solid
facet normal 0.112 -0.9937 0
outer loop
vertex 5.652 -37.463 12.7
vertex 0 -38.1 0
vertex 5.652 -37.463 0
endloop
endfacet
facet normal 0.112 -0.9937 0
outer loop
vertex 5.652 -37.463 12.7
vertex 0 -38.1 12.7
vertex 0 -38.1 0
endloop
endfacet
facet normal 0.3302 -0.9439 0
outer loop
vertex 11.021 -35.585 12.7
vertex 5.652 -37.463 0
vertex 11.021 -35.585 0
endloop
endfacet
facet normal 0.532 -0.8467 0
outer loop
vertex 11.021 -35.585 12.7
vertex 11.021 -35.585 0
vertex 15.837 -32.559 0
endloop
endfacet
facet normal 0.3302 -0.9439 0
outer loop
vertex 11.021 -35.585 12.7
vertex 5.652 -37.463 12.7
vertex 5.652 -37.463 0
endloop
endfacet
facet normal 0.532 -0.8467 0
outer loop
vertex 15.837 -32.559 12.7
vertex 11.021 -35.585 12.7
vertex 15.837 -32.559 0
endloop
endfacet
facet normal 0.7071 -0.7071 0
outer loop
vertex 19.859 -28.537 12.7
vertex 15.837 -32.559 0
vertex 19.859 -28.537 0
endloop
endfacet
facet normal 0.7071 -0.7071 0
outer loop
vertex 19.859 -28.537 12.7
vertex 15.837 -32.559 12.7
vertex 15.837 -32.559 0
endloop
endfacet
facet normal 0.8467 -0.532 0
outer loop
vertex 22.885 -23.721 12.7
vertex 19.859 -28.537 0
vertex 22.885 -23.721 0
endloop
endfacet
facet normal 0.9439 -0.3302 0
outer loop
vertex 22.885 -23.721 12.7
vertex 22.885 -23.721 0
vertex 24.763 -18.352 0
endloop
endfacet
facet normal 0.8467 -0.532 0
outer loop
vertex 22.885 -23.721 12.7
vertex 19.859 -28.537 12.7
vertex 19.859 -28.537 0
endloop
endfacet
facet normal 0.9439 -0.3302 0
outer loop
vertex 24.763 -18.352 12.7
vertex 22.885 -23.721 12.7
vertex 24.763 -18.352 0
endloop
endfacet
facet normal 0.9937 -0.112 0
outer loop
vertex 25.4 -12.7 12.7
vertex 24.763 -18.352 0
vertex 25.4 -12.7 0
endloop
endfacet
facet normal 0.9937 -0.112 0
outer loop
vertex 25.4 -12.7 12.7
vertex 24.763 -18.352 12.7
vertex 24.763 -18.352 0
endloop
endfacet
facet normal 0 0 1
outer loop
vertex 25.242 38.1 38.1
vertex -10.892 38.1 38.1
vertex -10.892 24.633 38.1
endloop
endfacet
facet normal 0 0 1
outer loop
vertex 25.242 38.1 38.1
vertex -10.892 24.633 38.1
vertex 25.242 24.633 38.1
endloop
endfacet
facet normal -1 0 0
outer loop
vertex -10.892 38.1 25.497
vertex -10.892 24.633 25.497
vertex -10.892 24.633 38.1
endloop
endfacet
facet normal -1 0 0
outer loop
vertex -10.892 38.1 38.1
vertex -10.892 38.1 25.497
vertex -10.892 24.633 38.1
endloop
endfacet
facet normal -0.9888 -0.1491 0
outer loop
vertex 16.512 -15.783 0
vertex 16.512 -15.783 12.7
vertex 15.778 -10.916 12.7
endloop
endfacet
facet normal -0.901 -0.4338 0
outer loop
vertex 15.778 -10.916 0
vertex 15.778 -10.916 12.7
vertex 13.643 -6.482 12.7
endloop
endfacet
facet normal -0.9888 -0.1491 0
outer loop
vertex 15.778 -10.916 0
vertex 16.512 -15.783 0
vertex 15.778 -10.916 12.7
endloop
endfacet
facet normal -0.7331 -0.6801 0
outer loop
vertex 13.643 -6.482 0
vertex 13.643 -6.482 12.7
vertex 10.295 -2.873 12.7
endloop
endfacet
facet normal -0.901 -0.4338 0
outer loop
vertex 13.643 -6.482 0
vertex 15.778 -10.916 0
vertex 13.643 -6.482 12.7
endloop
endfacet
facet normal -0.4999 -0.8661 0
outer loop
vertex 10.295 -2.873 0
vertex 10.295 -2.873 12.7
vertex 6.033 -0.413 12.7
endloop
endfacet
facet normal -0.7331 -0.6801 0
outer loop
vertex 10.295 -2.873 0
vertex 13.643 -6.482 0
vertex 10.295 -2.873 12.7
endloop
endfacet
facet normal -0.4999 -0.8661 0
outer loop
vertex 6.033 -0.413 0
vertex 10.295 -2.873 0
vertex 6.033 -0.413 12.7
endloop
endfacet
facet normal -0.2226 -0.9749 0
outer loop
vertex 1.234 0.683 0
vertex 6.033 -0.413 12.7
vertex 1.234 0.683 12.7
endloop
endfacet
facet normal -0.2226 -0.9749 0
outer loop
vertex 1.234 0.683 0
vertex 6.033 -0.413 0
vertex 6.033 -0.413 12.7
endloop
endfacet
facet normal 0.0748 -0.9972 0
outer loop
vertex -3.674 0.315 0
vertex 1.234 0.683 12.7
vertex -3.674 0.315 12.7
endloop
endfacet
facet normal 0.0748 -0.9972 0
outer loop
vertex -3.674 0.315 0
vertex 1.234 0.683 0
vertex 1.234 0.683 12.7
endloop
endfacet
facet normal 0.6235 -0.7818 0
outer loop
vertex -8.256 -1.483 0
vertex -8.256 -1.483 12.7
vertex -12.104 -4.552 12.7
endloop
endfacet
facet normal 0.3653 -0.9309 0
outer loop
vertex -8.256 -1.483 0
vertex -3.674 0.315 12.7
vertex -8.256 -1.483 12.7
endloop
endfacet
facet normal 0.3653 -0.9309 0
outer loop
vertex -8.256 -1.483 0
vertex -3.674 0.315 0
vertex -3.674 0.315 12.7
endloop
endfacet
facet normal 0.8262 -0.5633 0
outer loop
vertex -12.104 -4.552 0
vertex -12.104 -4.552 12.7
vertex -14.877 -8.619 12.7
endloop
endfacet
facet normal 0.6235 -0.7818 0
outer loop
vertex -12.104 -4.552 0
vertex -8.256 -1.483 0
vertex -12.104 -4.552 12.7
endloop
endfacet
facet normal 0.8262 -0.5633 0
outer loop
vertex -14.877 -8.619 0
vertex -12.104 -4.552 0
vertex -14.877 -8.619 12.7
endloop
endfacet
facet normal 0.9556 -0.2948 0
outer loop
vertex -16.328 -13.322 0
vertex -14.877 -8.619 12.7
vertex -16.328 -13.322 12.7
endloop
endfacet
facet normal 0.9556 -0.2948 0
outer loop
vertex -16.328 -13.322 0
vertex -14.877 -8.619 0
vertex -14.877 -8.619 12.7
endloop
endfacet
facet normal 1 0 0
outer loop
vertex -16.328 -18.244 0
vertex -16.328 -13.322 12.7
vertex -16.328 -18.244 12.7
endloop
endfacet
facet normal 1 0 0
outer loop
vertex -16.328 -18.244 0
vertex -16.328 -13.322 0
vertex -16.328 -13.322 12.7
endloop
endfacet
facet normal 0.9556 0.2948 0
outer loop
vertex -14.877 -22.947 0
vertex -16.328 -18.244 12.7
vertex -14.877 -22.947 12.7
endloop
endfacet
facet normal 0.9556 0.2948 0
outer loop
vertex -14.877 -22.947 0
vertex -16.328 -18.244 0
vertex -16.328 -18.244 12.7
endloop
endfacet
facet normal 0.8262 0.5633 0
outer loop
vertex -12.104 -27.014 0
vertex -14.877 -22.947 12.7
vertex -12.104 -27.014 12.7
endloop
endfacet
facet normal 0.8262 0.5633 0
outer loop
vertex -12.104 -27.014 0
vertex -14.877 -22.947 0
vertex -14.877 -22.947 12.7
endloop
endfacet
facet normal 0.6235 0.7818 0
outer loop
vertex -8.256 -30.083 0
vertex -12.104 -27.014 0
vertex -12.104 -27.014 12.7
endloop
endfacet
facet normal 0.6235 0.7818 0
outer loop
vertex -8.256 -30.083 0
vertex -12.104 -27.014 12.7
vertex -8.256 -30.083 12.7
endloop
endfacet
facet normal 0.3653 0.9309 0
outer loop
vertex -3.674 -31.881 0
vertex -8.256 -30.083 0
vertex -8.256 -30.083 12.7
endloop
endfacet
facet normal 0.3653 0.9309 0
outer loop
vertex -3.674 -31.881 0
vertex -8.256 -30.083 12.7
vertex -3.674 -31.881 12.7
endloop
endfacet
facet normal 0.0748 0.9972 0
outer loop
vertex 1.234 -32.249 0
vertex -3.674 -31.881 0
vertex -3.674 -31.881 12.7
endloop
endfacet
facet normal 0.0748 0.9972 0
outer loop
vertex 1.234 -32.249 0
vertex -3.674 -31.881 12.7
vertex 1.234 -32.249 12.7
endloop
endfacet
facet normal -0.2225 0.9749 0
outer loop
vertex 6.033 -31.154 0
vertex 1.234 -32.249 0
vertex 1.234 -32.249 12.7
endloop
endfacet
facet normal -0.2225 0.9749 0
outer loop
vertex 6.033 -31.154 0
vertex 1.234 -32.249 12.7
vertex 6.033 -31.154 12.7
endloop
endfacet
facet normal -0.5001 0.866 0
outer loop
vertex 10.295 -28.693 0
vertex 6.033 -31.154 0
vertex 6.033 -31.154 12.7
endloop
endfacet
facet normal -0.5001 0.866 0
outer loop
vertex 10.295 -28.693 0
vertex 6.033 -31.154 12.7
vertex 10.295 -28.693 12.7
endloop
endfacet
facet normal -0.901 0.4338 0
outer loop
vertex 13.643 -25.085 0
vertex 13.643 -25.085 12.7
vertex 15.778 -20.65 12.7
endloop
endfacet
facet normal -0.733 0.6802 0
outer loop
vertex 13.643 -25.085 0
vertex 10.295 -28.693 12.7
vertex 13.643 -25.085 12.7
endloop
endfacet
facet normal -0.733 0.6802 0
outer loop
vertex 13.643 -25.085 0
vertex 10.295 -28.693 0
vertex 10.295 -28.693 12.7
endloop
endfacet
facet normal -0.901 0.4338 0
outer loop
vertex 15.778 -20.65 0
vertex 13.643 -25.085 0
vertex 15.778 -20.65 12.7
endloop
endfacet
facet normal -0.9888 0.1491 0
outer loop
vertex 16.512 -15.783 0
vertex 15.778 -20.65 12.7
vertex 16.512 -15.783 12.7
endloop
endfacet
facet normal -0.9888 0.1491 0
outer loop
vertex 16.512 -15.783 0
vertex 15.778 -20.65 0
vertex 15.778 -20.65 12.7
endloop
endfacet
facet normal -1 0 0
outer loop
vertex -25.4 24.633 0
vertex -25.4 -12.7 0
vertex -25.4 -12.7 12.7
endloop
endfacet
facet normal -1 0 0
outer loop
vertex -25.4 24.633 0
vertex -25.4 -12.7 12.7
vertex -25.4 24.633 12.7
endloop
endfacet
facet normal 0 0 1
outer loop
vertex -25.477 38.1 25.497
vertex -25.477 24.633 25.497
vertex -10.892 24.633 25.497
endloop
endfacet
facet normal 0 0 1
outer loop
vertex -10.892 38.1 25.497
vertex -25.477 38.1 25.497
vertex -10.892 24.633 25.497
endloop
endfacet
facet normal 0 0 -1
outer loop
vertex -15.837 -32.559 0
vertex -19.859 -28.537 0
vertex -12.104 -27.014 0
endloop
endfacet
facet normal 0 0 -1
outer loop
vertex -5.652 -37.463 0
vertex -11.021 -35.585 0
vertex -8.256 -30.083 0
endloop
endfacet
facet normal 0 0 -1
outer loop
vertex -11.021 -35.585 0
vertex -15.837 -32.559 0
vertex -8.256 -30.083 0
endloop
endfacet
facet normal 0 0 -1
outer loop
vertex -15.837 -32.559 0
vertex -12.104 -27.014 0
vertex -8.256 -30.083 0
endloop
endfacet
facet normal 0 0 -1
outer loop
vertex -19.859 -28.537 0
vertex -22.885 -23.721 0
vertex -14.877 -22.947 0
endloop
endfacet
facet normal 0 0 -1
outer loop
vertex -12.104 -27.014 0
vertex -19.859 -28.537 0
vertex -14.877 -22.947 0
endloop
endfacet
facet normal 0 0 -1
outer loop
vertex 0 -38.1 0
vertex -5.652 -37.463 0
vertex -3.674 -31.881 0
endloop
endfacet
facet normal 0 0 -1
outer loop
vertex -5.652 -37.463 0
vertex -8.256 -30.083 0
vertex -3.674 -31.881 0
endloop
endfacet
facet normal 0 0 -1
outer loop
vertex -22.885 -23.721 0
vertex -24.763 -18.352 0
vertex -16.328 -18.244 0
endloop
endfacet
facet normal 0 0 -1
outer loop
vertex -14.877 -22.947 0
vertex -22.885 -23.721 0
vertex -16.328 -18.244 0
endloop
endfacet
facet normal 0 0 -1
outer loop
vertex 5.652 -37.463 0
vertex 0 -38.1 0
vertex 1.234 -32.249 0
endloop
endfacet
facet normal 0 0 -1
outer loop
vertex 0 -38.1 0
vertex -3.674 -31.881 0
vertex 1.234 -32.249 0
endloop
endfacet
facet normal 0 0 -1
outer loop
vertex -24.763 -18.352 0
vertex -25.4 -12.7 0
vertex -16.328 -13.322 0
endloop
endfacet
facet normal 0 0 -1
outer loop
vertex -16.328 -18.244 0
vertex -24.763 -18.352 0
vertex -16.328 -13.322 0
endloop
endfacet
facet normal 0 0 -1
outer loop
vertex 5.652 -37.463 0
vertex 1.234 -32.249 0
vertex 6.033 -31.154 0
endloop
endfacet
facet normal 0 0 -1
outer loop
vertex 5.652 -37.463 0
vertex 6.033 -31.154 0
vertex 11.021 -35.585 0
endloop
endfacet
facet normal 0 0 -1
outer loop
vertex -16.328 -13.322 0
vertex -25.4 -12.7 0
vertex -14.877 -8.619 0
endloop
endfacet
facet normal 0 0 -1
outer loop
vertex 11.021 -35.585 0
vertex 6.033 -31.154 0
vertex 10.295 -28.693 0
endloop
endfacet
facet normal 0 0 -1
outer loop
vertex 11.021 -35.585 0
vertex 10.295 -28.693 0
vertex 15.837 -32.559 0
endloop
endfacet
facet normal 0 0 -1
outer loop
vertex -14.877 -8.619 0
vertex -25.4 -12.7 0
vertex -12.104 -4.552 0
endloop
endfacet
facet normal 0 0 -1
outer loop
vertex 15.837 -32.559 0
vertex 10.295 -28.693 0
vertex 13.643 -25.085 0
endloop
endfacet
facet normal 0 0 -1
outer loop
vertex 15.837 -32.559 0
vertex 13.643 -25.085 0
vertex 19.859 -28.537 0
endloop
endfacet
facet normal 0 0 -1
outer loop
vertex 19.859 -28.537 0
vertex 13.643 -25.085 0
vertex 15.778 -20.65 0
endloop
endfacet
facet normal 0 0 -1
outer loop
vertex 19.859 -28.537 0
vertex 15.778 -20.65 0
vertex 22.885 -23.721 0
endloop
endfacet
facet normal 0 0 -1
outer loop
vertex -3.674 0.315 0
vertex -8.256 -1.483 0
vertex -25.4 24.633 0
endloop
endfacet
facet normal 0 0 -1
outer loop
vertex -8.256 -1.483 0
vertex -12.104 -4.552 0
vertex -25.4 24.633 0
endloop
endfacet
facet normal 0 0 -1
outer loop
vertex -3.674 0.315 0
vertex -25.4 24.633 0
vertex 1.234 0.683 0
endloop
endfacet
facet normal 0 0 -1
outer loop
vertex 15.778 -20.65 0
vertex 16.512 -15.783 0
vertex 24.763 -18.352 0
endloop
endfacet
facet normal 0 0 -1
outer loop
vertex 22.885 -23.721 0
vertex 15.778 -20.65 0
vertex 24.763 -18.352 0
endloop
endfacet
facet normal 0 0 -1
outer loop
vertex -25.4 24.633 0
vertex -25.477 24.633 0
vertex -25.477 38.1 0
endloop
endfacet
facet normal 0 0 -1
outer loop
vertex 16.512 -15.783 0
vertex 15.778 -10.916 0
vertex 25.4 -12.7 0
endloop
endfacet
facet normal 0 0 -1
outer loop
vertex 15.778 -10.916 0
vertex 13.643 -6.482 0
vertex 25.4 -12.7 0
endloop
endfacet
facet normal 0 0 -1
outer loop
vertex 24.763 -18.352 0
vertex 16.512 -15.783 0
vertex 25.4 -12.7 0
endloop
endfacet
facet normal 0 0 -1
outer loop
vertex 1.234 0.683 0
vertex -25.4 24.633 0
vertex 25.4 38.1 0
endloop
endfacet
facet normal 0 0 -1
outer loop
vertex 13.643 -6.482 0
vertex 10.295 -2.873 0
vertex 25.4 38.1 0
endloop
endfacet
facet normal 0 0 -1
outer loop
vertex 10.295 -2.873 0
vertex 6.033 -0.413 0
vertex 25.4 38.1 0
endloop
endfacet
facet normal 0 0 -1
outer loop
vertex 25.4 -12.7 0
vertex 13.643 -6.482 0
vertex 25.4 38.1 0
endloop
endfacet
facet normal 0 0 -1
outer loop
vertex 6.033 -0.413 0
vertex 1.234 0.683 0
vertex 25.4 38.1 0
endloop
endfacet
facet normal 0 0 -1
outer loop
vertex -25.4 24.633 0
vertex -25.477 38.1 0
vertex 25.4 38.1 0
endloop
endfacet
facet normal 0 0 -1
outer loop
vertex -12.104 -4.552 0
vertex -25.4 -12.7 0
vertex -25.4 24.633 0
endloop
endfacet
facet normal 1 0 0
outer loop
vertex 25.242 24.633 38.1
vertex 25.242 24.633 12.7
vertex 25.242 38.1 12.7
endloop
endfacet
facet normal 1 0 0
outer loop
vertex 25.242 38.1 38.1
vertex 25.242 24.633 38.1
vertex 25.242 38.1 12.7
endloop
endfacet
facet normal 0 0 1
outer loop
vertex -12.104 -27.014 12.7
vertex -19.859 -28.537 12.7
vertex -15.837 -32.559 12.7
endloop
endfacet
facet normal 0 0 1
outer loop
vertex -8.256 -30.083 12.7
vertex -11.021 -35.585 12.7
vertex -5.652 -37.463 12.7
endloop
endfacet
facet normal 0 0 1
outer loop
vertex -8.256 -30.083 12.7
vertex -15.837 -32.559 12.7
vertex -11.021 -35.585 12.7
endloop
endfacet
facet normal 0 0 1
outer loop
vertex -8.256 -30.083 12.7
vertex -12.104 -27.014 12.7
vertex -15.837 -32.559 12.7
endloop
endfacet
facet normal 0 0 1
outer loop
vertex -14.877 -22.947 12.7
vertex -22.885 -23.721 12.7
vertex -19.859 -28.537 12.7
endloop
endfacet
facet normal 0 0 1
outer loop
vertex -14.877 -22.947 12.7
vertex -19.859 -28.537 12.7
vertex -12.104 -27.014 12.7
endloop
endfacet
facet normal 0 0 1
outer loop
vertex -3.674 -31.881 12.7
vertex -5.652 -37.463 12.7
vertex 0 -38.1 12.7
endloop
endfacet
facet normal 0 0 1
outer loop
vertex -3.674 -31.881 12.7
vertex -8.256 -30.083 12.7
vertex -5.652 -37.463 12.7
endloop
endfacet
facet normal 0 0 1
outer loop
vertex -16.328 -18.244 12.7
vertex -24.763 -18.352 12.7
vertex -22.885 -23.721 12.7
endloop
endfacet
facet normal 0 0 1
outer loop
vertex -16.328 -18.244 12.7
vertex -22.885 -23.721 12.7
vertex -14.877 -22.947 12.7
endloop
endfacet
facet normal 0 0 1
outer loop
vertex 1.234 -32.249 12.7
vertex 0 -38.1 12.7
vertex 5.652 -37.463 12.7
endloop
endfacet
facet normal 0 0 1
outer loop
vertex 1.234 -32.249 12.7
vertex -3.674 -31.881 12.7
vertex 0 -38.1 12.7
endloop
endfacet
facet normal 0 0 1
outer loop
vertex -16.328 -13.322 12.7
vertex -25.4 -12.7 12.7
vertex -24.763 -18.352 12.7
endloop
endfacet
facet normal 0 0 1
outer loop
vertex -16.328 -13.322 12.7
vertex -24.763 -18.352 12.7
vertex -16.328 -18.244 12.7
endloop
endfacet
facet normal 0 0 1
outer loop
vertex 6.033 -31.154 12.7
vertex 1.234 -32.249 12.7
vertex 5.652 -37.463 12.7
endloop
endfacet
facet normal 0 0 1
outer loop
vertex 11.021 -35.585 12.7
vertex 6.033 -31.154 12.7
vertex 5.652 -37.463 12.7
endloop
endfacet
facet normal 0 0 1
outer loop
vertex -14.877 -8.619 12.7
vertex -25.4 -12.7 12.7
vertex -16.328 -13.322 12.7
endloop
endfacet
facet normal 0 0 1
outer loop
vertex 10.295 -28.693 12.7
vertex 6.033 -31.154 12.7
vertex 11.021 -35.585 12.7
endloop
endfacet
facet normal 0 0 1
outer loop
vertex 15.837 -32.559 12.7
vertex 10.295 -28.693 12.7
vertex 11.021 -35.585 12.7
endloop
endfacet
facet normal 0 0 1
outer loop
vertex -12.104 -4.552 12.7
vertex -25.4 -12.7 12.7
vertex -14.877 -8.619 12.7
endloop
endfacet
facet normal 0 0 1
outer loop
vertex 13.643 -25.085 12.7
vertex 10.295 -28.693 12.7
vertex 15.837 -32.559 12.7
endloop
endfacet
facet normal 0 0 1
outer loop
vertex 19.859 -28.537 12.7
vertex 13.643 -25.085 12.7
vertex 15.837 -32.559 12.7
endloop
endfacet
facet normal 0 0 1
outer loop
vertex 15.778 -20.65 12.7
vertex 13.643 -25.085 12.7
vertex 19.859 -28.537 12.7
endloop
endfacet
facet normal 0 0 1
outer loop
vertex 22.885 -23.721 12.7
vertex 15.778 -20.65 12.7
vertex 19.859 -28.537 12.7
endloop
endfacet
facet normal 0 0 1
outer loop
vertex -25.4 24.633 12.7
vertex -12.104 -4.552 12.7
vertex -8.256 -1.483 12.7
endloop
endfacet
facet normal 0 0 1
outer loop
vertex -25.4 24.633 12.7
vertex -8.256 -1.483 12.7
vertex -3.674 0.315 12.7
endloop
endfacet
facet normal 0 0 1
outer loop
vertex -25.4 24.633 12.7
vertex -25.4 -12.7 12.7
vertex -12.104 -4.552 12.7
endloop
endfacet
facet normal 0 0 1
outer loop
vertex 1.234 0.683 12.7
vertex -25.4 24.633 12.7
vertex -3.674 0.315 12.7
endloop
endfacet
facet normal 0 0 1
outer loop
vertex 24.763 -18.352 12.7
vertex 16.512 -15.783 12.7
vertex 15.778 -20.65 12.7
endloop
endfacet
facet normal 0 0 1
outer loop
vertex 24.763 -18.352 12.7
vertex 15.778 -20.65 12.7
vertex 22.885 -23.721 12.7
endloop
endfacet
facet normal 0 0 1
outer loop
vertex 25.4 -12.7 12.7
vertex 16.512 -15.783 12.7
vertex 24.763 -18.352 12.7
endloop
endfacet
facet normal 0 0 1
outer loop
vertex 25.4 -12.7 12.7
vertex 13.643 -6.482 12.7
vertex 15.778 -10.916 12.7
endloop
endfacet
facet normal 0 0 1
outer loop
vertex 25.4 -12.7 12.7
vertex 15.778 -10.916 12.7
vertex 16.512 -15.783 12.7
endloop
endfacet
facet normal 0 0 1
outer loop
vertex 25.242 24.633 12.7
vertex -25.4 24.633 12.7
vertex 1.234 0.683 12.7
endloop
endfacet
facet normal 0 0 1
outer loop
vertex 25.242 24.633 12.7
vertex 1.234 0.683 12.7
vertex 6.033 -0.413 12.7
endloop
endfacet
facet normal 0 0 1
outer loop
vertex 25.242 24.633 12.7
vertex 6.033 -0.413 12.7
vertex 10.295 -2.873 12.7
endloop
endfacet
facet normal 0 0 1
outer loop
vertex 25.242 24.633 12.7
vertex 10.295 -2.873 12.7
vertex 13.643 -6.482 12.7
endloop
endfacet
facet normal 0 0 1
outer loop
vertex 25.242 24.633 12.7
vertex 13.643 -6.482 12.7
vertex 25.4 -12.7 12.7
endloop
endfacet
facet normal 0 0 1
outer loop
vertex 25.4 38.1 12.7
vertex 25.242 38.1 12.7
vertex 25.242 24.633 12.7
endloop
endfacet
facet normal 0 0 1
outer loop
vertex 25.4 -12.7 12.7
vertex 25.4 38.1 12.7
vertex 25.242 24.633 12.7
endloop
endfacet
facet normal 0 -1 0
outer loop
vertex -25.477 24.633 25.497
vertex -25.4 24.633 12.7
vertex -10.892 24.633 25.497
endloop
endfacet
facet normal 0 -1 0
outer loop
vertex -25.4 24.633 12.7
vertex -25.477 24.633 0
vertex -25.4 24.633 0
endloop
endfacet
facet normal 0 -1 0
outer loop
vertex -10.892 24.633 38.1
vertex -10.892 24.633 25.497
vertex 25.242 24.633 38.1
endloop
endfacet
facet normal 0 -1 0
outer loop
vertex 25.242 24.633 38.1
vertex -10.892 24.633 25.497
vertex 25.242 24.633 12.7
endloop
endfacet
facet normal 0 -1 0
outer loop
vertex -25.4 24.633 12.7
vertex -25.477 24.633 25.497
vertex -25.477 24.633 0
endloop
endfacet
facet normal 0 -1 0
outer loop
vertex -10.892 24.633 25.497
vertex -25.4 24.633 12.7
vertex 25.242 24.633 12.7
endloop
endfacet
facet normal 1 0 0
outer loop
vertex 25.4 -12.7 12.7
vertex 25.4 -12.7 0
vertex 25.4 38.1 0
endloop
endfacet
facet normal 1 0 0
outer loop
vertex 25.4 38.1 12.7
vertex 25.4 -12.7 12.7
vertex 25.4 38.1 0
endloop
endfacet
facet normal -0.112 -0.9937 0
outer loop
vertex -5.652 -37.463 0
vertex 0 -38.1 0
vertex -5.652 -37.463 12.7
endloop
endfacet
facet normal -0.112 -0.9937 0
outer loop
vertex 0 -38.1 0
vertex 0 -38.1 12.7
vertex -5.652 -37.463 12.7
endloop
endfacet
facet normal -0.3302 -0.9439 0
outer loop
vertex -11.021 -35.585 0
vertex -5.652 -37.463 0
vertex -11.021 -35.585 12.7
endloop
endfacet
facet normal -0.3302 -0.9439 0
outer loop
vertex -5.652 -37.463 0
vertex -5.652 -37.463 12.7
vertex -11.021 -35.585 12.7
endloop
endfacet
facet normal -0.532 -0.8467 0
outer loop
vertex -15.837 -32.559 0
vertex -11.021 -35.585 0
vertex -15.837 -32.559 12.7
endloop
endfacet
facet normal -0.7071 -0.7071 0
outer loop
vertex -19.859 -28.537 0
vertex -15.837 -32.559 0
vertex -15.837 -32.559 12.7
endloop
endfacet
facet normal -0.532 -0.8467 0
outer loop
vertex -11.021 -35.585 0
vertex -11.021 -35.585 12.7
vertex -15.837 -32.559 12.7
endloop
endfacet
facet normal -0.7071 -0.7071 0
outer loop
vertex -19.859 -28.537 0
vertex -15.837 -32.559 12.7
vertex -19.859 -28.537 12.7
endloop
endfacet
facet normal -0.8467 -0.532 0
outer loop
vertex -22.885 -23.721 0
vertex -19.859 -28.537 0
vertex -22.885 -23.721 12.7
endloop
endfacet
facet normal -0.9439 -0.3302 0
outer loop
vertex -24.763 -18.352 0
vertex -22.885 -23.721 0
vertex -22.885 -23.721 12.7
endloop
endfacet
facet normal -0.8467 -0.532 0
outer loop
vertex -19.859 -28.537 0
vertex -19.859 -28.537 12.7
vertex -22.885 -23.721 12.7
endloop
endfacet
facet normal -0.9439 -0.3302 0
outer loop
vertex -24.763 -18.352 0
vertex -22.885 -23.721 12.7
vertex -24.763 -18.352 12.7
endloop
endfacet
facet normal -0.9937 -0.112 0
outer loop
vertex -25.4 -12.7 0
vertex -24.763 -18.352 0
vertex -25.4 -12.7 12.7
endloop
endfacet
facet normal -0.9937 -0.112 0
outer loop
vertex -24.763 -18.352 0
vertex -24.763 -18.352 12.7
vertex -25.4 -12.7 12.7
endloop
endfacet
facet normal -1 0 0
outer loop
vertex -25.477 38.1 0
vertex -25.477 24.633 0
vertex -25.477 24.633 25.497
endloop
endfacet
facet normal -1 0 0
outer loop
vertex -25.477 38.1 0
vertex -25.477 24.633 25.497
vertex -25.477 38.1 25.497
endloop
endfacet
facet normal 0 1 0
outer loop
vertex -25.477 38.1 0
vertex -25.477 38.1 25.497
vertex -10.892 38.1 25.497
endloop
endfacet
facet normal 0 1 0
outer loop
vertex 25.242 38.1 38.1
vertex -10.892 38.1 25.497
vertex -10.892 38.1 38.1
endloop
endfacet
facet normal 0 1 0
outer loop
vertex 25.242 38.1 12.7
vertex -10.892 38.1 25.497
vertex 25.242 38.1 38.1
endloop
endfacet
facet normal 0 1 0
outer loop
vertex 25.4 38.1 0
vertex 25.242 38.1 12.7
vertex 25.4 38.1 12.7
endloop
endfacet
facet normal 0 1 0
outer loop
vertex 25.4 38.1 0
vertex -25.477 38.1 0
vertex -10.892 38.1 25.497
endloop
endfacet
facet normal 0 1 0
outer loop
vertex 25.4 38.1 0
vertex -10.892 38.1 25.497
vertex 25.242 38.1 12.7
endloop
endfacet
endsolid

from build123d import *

# Parameters (mm, degrees)
F0_W     = 50.8
F0_H     = 76.2
F1_DEPTH = 12.7
F2_R     = 25.4
F3_R     = 25.39999
F4_W     = 50.7186688483
F4_H     = 13.4670715779
F5_DEPTH = 38.1
F6_W     = 14.5849827677
F6_H     = 12.6033662766
F7_DEPTH = 13.4680715779
F8_R     = 16.5120085349
F9_DEPTH = 38.101


# Not quite as in the source:
# - a fillet or chamfer is up to 0.001 mm smaller than in the source, because OpenCascade refuses the exact size


with BuildPart() as f1:
    # F0 (on Top) → F1 (new body)
    with BuildSketch(Plane.XY):
        Rectangle(F0_W, F0_H)
    extrude(amount=F1_DEPTH)

    # F2
    f2_edges = [f1.edges().sort_by_distance(p)[0] for p in [
        (25.4, -38.1, 6.35),
    ]]
    fillet(f2_edges, radius=F2_R)

    # F3 (radius 25.4 in the source; OpenCascade refuses exactly that, so slightly less here)
    f3_edges = [f1.edges().sort_by_distance(p)[0] for p in [
        (-25.4, -38.1, 6.35),
    ]]
    fillet(f3_edges, radius=F3_R)

    # F4 (on Top) → F5 (join)
    with BuildSketch(Plane.XY):
        with Locations((-0.1172143966, 31.366464211)):
            Rectangle(F4_W, F4_H)
    extrude(amount=F5_DEPTH)

    # F6 (on face) → F7 (cut, through all)
    with BuildSketch(Plane.XZ.offset(-24.6329284221)):
        with Locations((-18.1840574369, 31.7983168617)):
            Rectangle(F6_W, F6_H)
    extrude(amount=-F7_DEPTH, mode=Mode.SUBTRACT)

    # F8 (on Top) → F9 (cut, through all)
    with BuildSketch(Plane.XY):
        with Locations((0, -15.7830994576)):
            Circle(F8_R)
    extrude(amount=F9_DEPTH, mode=Mode.SUBTRACT)


solid = f1.part
